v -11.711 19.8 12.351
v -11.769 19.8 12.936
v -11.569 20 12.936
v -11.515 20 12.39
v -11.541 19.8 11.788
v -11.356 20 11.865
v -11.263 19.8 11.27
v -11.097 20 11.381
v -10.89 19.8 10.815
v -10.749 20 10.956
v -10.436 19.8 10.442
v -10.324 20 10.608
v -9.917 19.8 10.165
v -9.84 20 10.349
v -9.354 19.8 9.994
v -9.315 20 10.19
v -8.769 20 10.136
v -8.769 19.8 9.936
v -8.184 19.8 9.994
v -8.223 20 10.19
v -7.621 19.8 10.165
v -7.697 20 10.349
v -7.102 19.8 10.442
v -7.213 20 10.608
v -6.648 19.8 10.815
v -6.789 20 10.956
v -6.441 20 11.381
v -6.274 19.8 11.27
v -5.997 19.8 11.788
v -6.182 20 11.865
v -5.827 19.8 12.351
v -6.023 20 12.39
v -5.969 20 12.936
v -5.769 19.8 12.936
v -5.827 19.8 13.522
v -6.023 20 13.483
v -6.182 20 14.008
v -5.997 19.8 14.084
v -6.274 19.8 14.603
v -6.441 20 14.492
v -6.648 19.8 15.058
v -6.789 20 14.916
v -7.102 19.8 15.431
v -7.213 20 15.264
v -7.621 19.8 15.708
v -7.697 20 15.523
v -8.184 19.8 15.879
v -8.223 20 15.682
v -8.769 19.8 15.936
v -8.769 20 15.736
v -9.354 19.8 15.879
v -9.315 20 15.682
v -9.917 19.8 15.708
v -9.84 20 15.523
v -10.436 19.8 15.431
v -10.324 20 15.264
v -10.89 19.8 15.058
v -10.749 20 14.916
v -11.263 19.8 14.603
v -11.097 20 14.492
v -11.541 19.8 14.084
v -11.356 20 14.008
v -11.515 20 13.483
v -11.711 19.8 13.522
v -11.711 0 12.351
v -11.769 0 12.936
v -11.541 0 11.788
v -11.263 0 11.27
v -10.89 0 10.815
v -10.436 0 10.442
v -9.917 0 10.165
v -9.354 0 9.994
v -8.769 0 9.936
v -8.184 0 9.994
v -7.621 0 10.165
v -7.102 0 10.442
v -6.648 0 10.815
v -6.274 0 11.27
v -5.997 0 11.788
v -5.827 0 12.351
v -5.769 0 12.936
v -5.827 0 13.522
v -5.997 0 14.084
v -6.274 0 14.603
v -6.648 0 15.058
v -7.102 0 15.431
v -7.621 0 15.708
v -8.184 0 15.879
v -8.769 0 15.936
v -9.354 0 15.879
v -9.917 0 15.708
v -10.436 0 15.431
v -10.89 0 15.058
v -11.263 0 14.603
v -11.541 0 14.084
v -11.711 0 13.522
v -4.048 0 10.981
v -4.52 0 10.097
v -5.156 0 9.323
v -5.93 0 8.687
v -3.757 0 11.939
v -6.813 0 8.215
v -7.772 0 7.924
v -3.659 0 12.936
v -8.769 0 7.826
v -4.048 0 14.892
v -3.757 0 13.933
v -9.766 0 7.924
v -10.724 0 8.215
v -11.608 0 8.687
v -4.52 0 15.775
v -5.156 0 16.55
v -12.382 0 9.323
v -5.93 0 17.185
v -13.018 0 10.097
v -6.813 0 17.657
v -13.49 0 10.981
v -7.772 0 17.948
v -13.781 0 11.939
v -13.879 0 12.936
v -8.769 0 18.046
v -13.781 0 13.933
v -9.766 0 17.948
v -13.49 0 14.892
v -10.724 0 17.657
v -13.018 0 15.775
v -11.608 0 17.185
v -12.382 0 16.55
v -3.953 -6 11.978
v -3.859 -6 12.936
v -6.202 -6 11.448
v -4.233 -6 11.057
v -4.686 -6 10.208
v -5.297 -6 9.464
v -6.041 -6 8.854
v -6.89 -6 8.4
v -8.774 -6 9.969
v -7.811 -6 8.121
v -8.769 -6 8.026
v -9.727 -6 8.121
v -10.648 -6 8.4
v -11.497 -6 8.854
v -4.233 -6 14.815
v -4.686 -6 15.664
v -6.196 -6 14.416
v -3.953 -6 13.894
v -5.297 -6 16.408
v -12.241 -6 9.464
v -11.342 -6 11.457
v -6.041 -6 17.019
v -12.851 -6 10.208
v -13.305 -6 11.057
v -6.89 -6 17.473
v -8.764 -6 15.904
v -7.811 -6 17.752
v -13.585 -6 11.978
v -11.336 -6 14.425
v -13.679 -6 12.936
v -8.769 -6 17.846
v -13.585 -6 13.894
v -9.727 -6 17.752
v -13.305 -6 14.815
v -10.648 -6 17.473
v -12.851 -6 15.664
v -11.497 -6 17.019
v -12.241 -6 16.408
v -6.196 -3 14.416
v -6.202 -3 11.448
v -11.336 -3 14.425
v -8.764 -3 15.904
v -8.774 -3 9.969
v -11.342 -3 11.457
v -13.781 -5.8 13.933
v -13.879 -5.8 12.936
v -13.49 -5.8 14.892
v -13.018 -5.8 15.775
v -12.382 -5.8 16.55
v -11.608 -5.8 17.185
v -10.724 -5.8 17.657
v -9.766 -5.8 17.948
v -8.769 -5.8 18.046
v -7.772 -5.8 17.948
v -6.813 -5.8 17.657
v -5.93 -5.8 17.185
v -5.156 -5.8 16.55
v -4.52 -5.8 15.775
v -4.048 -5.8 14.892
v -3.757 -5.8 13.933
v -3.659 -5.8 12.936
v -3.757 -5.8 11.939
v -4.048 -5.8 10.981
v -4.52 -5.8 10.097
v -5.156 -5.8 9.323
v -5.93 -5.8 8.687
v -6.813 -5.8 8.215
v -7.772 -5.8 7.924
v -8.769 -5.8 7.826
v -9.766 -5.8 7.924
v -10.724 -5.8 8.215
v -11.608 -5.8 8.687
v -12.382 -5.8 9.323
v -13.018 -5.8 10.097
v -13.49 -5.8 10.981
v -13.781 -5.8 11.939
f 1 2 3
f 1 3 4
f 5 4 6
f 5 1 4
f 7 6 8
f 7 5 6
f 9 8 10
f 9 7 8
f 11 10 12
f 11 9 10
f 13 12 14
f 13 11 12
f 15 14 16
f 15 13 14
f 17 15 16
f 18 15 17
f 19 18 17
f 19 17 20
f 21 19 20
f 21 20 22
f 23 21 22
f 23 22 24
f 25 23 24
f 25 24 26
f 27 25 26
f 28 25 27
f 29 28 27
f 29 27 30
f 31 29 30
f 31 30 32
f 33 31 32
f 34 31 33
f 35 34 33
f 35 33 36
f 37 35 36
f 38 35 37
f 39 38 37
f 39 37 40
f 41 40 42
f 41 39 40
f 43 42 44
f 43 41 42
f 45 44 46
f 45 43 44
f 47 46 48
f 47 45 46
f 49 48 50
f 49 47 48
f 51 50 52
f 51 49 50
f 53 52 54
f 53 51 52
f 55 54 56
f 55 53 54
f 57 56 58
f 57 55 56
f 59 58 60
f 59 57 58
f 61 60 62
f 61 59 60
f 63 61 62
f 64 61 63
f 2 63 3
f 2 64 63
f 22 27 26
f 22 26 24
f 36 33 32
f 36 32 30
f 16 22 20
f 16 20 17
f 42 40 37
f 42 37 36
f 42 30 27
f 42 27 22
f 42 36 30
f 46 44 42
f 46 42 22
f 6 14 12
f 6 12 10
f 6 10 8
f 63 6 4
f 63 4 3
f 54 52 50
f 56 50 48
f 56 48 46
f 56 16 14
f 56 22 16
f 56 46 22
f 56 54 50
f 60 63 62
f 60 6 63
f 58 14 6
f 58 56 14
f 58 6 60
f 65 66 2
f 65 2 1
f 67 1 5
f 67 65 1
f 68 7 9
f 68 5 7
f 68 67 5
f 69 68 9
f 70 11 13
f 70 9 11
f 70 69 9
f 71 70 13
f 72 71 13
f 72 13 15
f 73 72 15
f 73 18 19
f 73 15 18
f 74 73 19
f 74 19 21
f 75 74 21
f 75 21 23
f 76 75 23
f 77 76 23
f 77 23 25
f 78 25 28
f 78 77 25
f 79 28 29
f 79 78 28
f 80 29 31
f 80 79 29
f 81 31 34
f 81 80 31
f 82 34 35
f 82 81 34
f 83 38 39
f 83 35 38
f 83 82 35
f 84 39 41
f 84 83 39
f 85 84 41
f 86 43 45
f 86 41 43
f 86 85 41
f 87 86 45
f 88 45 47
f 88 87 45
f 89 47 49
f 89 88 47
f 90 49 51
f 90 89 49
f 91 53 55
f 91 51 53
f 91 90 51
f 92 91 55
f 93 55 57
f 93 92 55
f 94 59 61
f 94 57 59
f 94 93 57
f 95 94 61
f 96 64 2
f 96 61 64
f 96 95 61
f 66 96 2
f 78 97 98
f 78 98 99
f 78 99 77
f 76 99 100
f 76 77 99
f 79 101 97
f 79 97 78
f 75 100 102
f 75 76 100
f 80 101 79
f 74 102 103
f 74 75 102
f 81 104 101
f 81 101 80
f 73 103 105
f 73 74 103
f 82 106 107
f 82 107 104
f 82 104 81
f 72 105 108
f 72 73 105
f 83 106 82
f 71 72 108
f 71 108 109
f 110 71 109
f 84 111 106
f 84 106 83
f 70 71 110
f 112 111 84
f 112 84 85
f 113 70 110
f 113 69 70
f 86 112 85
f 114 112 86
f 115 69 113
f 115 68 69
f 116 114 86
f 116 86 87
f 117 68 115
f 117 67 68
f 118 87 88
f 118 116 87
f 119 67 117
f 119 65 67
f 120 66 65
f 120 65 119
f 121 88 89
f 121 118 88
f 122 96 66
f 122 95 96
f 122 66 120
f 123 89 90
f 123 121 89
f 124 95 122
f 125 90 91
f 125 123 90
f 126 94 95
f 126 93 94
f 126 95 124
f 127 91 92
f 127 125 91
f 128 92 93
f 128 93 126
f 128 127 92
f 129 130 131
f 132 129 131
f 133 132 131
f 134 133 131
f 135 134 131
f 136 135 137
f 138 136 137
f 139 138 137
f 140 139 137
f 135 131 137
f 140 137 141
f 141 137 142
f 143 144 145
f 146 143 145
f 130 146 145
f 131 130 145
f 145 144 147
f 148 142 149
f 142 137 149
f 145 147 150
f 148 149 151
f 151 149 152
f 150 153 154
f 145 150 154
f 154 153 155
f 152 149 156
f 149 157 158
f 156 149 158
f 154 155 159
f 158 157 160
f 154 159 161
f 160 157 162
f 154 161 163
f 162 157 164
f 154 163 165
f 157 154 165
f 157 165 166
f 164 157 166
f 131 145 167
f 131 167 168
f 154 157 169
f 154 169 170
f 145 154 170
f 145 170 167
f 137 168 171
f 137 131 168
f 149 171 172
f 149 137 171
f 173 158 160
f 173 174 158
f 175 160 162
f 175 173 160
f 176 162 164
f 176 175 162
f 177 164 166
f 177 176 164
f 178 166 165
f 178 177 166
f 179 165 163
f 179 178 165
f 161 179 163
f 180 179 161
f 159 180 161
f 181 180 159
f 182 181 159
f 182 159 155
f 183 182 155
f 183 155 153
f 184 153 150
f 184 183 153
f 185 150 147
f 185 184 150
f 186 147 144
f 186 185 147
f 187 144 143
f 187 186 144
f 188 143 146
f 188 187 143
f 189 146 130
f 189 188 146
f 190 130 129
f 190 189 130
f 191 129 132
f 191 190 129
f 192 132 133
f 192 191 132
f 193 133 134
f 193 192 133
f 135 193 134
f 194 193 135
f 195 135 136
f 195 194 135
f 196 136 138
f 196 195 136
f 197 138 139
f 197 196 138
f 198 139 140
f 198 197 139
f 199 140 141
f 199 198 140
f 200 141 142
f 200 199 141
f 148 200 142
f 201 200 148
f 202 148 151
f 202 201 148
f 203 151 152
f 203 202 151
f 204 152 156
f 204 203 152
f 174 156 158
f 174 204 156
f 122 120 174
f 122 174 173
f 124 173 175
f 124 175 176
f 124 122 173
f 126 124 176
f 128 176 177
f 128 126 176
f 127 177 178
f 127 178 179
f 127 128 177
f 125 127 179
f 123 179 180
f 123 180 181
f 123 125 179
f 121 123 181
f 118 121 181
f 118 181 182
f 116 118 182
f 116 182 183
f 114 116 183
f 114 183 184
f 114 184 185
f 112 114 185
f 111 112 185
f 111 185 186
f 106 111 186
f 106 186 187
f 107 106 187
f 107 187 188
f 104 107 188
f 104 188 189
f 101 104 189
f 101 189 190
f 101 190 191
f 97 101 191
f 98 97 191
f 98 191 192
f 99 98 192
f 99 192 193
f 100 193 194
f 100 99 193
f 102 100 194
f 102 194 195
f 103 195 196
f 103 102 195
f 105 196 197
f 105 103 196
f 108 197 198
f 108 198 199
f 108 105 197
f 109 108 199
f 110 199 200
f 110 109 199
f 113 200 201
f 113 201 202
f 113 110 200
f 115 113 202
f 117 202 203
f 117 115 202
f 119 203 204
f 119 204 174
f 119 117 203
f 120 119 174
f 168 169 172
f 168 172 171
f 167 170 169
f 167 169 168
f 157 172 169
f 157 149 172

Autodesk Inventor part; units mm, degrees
ref_plane "YZ Plane" through (0, 0, 0) normal (1, 0, 0) x (0, 1, 0)
ref_plane "XZ Plane" through (0, 0, 0) normal (0, 1, 0) x (-1, 0, 0)
ref_plane "XY Plane" through (0, 0, 0) normal (0, 0, 1) x (1, 0, 0)
sketch "Boceto1" plane through (0, 0, 0) normal (0, 1, 0) x (-1, 0, 0)
  circle A0 centre (8.7689, 12.9363) radius 3
  circle A1 centre (8.7689, 12.9363) radius 5.11
  point P0 (0, 0)
  dimension "d0" = 6
  dimension "d1" = 10.22
extrude "Extrusión1" add sketch "Boceto1" along normal blind 20 contours A0
extrude "Extrusión2" add sketch "Boceto1" against normal blind 6 contours A0 | A1
sketch "Boceto2" plane through (-8.7689, -6, 12.9363) normal (0, -1, 0) x (1, 0, 0)
  line L0 (-2.5726, -1.4793) -> (-2.5674, 1.4883)
  line L1 (-2.5674, 1.4883) -> (0.0052, 2.9676)
  line L2 (0.0052, 2.9676) -> (2.5726, 1.4793)
  line L3 (2.5726, 1.4793) -> (2.5674, -1.4883)
  line L4 (2.5674, -1.4883) -> (-0.0052, -2.9676)
  line L5 (-0.0052, -2.9676) -> (-2.5726, -1.4793)
  point P0 (8.7689, -12.9363)
  point P1 (0, 0)
  dimension "d6" = 5.14
extrude "Extrusión3" cut sketch "Boceto2" against normal blind 3
thread "Rosca1" size "M6x1" class "6g" standard "ISO Metric profile" length 430
chamfer "Chaflán1" distance 0.2 angle 45 1 edges at (-3.6589, -6, 12.9363) measured on face at (-12.1856, -6, 12.9393)
chamfer "Chaflán2" distance 0.2 angle 45 1 edges at (-5.7689, 20, 12.9363) measured on face at (-7.9784, 20, 13.0158)
properties part number "Tornillo allen cabeza cilindrica M6x20mm"
